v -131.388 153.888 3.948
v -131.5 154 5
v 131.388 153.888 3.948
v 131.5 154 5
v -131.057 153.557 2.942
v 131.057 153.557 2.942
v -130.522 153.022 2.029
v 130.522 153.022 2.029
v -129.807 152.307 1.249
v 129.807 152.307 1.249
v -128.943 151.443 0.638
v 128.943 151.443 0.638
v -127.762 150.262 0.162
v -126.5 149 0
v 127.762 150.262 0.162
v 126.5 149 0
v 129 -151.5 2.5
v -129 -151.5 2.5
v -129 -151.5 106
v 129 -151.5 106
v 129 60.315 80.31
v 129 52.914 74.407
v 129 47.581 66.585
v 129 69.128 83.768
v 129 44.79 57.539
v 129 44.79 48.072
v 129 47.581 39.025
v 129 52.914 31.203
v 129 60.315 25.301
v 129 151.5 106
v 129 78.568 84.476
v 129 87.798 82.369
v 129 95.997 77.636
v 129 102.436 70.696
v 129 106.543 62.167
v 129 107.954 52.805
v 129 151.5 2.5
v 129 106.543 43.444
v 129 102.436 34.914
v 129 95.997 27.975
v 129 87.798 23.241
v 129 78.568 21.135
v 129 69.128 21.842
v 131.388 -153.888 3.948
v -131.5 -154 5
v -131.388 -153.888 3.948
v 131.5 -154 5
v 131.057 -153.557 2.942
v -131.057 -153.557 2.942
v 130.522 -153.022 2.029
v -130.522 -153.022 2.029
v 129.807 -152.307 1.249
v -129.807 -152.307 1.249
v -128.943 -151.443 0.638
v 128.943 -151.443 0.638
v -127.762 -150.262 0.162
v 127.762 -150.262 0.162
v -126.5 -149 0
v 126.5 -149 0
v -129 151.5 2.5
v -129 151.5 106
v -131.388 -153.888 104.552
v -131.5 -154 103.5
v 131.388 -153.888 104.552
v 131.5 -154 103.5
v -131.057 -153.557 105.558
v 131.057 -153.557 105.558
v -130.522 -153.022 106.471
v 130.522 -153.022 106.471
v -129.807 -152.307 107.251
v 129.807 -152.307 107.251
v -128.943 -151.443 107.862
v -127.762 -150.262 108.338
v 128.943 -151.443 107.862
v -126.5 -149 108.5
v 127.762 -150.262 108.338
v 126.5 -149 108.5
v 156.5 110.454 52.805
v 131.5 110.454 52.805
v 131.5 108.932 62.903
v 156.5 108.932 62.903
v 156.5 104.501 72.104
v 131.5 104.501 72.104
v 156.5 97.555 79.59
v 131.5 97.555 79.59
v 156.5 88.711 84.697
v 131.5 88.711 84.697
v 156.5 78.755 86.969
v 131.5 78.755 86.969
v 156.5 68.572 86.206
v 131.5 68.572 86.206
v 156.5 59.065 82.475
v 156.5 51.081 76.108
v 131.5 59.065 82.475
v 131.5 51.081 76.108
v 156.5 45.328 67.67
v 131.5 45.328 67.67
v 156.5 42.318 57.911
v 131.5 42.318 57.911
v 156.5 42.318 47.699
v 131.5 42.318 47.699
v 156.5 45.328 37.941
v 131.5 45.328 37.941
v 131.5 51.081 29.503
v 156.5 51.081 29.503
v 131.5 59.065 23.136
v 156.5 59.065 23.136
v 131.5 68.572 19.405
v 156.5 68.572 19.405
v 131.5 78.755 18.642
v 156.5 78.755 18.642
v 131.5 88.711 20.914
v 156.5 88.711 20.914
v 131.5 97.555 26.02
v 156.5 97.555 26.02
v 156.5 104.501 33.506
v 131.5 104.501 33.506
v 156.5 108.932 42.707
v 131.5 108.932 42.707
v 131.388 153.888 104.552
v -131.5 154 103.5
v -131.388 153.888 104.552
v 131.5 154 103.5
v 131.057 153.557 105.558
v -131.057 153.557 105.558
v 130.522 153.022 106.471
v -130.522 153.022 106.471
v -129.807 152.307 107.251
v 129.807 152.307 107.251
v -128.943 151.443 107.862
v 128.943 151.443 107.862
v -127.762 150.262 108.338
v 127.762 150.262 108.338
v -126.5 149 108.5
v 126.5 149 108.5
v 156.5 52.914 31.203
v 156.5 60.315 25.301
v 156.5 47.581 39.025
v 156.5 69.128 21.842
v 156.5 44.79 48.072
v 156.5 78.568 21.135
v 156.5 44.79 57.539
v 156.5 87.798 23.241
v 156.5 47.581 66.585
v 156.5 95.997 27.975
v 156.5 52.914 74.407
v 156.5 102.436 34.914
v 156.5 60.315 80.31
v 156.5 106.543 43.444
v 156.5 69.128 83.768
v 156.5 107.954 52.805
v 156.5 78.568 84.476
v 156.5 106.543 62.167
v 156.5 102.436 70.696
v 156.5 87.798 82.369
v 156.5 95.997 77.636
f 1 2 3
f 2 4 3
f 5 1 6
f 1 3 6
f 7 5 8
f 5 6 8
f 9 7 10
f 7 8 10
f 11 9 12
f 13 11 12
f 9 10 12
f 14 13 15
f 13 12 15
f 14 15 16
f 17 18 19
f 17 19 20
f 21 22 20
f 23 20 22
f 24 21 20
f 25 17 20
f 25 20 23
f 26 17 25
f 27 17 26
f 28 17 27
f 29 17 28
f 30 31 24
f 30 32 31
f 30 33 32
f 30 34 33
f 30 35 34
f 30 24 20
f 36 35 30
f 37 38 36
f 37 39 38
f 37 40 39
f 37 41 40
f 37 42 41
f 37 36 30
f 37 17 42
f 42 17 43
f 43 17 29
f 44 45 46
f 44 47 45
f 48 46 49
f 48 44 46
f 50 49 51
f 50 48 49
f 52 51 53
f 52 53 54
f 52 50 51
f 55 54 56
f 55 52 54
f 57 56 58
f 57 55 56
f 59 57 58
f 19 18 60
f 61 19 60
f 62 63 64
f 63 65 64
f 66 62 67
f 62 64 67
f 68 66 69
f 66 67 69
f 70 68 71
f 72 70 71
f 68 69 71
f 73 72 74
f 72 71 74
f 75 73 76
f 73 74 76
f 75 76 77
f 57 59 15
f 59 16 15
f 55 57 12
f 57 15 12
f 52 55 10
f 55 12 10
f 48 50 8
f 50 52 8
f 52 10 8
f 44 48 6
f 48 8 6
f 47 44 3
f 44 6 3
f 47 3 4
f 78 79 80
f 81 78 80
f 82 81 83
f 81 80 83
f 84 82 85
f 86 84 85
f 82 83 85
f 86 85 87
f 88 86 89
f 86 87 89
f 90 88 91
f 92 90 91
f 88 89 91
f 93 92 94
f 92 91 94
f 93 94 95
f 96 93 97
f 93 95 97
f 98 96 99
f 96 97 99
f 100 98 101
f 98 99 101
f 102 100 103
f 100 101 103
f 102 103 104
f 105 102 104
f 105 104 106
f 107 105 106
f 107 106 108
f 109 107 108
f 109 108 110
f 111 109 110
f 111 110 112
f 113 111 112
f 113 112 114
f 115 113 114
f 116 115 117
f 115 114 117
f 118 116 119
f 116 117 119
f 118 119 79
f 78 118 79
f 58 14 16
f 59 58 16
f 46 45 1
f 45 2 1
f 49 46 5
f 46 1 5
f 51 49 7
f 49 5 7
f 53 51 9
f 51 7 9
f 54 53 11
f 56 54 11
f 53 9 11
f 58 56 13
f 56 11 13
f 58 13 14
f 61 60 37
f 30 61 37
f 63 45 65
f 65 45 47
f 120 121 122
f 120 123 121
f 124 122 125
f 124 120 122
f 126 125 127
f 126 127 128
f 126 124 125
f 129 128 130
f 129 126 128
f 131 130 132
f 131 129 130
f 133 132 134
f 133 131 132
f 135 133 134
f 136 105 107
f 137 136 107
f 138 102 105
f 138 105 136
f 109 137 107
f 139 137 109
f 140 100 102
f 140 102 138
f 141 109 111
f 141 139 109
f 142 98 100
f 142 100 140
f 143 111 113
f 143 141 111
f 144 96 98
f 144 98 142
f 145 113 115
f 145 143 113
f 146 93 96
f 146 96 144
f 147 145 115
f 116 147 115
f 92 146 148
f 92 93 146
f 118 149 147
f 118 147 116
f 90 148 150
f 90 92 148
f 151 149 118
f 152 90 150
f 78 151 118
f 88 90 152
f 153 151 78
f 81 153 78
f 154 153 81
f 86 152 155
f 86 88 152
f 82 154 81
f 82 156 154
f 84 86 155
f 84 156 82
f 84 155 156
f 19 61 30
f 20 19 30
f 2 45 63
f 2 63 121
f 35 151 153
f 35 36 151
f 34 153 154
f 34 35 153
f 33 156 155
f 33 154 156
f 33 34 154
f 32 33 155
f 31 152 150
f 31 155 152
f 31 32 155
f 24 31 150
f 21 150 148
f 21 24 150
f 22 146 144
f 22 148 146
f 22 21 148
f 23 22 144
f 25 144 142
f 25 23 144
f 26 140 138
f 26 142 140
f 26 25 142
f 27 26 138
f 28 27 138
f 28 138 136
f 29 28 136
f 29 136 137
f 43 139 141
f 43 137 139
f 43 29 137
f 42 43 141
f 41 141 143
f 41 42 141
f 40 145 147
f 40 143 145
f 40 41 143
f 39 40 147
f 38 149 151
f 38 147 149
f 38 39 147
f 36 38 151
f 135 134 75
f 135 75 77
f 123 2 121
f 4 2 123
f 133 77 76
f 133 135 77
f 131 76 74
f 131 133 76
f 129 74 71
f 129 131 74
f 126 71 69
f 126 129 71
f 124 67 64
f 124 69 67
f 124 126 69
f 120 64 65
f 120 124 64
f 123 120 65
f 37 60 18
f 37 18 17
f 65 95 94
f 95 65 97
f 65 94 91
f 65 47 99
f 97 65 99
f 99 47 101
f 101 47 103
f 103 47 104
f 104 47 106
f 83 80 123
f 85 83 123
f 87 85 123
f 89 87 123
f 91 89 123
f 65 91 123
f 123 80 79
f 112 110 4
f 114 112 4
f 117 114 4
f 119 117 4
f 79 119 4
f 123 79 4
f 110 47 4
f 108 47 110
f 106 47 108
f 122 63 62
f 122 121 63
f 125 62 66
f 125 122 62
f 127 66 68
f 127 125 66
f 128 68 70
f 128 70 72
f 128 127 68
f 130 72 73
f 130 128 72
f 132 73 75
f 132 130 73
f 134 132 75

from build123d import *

# Parameters (mm, degrees)
F0_W     = 263
F0_H     = 308
F1_DEPTH = 108.5
F2_R     = 34.2595
F3_DEPTH = 25
F4_T     = -2.5
F5_R     = 5


with BuildPart() as f1:
    # F0 (on Top) → F1 (new body)
    with BuildSketch(Plane.XY):
        Rectangle(F0_W, F0_H)
    extrude(amount=F1_DEPTH)

    # F2 (on face) → F3 (join)
    with BuildSketch(Plane.YZ.offset(131.5)):
        with Locations((76.1949643493, 52.8052560985)):
            Circle(F2_R)
    extrude(amount=F3_DEPTH)

    # F4
    f4_openings = [f1.faces().sort_by_distance(p)[0] for p in [
        (156.5, 76.194964, 52.805256),
    ]]
    offset(amount=F4_T, openings=f4_openings, kind=Kind.INTERSECTION)

    # F5
    f5_edges = [f1.edges().sort_by_distance(p)[0] for p in [
        (0, 154, 108.5),
        (0, -154, 108.5),
        (0, 154, 0),
        (0, -154, 0),
        (131.5, 0, 108.5),
        (131.5, 0, 0),
        (-131.5, 0, 108.5),
        (-131.5, 0, 0),
    ]]
    fillet(f5_edges, radius=F5_R)


solid = f1.part
